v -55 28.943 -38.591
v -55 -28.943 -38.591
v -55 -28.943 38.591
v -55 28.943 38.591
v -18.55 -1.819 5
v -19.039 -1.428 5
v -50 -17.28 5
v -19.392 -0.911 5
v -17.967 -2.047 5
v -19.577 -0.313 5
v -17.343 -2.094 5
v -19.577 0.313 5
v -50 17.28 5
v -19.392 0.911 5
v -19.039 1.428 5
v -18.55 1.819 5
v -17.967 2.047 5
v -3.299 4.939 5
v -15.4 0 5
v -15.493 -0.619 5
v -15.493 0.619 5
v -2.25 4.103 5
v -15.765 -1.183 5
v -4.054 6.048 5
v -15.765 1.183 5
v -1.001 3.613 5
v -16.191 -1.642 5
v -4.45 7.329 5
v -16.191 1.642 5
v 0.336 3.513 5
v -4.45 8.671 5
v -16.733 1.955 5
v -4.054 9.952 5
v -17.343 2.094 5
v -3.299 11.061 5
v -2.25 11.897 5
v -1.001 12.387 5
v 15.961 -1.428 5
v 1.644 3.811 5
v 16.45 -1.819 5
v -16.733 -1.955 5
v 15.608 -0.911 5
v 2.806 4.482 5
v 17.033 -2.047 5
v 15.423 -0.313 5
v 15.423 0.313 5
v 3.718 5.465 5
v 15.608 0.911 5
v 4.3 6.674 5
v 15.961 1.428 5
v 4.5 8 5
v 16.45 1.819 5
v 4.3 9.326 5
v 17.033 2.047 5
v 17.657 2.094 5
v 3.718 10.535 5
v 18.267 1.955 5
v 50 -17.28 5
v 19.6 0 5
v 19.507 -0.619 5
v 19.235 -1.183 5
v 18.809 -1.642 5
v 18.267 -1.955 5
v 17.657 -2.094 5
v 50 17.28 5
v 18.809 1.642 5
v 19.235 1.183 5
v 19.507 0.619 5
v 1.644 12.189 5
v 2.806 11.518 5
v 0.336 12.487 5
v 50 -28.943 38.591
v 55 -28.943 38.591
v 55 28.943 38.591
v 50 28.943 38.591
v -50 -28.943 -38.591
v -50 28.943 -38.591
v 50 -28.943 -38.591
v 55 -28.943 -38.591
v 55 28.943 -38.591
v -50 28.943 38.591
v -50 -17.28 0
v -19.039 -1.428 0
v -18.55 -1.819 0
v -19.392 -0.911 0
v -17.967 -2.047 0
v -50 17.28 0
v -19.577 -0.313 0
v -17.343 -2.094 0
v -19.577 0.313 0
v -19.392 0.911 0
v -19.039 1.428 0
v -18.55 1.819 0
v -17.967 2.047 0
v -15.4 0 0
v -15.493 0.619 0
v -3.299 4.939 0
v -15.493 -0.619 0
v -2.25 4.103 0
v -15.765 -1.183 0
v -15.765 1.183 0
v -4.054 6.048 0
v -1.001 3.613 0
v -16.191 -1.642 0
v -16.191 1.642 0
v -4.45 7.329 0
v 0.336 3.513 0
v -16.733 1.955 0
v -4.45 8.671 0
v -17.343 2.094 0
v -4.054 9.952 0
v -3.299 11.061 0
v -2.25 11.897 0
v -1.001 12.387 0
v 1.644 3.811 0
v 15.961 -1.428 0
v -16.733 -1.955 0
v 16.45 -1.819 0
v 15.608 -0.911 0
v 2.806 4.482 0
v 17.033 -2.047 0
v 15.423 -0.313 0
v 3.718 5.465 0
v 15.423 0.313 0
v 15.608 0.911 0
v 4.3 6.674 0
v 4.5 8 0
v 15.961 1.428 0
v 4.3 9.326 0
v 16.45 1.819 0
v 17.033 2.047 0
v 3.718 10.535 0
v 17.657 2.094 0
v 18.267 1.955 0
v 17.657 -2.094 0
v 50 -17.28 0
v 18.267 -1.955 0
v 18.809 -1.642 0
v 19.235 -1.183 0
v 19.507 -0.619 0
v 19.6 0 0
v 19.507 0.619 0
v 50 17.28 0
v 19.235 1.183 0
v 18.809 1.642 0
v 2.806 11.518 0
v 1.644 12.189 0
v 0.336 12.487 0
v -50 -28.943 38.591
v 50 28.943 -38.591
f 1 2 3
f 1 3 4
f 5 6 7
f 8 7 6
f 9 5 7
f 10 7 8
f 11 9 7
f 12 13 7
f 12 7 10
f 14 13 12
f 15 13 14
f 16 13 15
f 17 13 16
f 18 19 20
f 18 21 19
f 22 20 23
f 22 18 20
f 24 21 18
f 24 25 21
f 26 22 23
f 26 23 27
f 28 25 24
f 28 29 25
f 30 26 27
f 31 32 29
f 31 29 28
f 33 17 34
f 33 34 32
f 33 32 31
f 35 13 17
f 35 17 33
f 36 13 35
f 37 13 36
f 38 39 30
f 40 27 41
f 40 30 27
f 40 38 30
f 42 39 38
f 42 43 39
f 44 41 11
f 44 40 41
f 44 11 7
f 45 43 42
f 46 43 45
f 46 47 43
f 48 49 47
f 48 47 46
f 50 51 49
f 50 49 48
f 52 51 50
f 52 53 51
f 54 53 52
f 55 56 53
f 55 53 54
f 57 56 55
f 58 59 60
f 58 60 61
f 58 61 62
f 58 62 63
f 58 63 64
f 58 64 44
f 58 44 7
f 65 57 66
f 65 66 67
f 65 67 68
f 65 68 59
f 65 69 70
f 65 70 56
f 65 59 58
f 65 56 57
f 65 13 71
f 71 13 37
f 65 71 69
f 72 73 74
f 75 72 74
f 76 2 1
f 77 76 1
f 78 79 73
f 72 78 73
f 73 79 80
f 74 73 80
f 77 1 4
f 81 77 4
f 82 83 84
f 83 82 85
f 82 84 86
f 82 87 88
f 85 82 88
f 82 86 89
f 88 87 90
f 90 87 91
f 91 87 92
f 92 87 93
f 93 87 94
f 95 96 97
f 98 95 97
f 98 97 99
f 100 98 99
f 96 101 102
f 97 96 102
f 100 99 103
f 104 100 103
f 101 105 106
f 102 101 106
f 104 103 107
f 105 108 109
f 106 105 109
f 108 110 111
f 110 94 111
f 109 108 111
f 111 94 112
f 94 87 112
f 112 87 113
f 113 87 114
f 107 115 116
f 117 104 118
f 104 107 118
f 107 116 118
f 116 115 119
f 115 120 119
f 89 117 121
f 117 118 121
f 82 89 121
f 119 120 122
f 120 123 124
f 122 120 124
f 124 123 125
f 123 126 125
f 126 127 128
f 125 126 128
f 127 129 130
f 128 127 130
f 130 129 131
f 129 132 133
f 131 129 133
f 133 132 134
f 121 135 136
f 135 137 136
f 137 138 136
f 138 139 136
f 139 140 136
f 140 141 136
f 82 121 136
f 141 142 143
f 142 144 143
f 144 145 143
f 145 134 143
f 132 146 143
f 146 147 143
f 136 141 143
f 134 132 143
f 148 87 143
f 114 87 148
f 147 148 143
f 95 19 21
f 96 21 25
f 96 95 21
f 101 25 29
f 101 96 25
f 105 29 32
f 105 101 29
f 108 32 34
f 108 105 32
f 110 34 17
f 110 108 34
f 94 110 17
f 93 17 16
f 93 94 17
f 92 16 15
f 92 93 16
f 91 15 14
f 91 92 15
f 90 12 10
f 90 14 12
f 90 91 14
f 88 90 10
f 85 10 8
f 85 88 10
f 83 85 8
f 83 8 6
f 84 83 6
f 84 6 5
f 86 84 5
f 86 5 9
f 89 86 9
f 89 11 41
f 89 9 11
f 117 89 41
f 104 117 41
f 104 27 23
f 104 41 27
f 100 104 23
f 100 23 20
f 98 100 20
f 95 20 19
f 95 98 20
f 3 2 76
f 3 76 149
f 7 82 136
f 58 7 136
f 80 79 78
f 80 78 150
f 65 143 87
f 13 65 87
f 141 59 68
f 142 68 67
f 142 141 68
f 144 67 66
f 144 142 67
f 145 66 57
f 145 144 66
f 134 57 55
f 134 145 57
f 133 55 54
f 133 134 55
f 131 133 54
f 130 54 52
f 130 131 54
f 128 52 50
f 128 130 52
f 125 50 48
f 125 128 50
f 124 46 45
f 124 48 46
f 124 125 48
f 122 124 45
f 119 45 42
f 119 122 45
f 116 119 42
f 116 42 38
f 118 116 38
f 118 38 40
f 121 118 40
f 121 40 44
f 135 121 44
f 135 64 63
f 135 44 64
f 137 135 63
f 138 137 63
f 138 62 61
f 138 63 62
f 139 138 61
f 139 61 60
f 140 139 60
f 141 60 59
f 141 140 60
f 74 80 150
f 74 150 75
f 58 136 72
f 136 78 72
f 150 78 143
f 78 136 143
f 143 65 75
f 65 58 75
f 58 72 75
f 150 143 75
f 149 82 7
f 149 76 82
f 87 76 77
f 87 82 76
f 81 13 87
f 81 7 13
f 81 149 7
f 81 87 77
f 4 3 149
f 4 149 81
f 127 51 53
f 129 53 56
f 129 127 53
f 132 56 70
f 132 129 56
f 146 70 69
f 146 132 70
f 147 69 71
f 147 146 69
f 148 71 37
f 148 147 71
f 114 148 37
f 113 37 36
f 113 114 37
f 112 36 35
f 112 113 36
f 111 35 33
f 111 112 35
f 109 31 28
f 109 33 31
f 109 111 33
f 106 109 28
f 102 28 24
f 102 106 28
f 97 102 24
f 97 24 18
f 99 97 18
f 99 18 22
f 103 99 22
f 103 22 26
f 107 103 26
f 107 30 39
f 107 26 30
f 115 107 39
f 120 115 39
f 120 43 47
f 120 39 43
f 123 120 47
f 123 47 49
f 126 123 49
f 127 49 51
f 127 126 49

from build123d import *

# Parameters (mm, degrees)
F0_R     = 2.1
F0_R_2   = 4.5
F1_DEPTH = 5
F3_W     = 57.8866787255
F3_H     = 77.1822407842
F4_DEPTH = 5


with BuildPart() as f1:
    # F0 (on Top) → F1 (new body)
    with BuildSketch(Plane.XY):
        Polygon((50, 12.2797499597), (50, 17.2797499597), (-50, 17.2797499597), (-50, 12.2797499597), (-55, 12.2797499597), (-55, -12.2797499597), (-50, -12.2797499597), (-50, -17.2797499597), (50, -17.2797499597), (50, -12.2797499597), (55, -12.2797499597), (55, 12.2797499597), align=None)
        with Locations((-17.5, 0)):
            Circle(F0_R, mode=Mode.SUBTRACT)
        with Locations((17.5, 0)):
            Circle(F0_R, mode=Mode.SUBTRACT)
        with Locations((0, 8)):
            Circle(F0_R_2, mode=Mode.SUBTRACT)
    extrude(amount=F1_DEPTH)

    # F3 (on offset) → F4 (join)
    with BuildSketch(Plane.YZ.offset(55)):
        Rectangle(F3_W, F3_H)
    extrude(amount=-F4_DEPTH)

    # F5: F1 across plane


with BuildPart() as f1_1:
    add(f1.part)
    add(f1.part.mirror(Plane.YZ))


solid = f1_1.part
